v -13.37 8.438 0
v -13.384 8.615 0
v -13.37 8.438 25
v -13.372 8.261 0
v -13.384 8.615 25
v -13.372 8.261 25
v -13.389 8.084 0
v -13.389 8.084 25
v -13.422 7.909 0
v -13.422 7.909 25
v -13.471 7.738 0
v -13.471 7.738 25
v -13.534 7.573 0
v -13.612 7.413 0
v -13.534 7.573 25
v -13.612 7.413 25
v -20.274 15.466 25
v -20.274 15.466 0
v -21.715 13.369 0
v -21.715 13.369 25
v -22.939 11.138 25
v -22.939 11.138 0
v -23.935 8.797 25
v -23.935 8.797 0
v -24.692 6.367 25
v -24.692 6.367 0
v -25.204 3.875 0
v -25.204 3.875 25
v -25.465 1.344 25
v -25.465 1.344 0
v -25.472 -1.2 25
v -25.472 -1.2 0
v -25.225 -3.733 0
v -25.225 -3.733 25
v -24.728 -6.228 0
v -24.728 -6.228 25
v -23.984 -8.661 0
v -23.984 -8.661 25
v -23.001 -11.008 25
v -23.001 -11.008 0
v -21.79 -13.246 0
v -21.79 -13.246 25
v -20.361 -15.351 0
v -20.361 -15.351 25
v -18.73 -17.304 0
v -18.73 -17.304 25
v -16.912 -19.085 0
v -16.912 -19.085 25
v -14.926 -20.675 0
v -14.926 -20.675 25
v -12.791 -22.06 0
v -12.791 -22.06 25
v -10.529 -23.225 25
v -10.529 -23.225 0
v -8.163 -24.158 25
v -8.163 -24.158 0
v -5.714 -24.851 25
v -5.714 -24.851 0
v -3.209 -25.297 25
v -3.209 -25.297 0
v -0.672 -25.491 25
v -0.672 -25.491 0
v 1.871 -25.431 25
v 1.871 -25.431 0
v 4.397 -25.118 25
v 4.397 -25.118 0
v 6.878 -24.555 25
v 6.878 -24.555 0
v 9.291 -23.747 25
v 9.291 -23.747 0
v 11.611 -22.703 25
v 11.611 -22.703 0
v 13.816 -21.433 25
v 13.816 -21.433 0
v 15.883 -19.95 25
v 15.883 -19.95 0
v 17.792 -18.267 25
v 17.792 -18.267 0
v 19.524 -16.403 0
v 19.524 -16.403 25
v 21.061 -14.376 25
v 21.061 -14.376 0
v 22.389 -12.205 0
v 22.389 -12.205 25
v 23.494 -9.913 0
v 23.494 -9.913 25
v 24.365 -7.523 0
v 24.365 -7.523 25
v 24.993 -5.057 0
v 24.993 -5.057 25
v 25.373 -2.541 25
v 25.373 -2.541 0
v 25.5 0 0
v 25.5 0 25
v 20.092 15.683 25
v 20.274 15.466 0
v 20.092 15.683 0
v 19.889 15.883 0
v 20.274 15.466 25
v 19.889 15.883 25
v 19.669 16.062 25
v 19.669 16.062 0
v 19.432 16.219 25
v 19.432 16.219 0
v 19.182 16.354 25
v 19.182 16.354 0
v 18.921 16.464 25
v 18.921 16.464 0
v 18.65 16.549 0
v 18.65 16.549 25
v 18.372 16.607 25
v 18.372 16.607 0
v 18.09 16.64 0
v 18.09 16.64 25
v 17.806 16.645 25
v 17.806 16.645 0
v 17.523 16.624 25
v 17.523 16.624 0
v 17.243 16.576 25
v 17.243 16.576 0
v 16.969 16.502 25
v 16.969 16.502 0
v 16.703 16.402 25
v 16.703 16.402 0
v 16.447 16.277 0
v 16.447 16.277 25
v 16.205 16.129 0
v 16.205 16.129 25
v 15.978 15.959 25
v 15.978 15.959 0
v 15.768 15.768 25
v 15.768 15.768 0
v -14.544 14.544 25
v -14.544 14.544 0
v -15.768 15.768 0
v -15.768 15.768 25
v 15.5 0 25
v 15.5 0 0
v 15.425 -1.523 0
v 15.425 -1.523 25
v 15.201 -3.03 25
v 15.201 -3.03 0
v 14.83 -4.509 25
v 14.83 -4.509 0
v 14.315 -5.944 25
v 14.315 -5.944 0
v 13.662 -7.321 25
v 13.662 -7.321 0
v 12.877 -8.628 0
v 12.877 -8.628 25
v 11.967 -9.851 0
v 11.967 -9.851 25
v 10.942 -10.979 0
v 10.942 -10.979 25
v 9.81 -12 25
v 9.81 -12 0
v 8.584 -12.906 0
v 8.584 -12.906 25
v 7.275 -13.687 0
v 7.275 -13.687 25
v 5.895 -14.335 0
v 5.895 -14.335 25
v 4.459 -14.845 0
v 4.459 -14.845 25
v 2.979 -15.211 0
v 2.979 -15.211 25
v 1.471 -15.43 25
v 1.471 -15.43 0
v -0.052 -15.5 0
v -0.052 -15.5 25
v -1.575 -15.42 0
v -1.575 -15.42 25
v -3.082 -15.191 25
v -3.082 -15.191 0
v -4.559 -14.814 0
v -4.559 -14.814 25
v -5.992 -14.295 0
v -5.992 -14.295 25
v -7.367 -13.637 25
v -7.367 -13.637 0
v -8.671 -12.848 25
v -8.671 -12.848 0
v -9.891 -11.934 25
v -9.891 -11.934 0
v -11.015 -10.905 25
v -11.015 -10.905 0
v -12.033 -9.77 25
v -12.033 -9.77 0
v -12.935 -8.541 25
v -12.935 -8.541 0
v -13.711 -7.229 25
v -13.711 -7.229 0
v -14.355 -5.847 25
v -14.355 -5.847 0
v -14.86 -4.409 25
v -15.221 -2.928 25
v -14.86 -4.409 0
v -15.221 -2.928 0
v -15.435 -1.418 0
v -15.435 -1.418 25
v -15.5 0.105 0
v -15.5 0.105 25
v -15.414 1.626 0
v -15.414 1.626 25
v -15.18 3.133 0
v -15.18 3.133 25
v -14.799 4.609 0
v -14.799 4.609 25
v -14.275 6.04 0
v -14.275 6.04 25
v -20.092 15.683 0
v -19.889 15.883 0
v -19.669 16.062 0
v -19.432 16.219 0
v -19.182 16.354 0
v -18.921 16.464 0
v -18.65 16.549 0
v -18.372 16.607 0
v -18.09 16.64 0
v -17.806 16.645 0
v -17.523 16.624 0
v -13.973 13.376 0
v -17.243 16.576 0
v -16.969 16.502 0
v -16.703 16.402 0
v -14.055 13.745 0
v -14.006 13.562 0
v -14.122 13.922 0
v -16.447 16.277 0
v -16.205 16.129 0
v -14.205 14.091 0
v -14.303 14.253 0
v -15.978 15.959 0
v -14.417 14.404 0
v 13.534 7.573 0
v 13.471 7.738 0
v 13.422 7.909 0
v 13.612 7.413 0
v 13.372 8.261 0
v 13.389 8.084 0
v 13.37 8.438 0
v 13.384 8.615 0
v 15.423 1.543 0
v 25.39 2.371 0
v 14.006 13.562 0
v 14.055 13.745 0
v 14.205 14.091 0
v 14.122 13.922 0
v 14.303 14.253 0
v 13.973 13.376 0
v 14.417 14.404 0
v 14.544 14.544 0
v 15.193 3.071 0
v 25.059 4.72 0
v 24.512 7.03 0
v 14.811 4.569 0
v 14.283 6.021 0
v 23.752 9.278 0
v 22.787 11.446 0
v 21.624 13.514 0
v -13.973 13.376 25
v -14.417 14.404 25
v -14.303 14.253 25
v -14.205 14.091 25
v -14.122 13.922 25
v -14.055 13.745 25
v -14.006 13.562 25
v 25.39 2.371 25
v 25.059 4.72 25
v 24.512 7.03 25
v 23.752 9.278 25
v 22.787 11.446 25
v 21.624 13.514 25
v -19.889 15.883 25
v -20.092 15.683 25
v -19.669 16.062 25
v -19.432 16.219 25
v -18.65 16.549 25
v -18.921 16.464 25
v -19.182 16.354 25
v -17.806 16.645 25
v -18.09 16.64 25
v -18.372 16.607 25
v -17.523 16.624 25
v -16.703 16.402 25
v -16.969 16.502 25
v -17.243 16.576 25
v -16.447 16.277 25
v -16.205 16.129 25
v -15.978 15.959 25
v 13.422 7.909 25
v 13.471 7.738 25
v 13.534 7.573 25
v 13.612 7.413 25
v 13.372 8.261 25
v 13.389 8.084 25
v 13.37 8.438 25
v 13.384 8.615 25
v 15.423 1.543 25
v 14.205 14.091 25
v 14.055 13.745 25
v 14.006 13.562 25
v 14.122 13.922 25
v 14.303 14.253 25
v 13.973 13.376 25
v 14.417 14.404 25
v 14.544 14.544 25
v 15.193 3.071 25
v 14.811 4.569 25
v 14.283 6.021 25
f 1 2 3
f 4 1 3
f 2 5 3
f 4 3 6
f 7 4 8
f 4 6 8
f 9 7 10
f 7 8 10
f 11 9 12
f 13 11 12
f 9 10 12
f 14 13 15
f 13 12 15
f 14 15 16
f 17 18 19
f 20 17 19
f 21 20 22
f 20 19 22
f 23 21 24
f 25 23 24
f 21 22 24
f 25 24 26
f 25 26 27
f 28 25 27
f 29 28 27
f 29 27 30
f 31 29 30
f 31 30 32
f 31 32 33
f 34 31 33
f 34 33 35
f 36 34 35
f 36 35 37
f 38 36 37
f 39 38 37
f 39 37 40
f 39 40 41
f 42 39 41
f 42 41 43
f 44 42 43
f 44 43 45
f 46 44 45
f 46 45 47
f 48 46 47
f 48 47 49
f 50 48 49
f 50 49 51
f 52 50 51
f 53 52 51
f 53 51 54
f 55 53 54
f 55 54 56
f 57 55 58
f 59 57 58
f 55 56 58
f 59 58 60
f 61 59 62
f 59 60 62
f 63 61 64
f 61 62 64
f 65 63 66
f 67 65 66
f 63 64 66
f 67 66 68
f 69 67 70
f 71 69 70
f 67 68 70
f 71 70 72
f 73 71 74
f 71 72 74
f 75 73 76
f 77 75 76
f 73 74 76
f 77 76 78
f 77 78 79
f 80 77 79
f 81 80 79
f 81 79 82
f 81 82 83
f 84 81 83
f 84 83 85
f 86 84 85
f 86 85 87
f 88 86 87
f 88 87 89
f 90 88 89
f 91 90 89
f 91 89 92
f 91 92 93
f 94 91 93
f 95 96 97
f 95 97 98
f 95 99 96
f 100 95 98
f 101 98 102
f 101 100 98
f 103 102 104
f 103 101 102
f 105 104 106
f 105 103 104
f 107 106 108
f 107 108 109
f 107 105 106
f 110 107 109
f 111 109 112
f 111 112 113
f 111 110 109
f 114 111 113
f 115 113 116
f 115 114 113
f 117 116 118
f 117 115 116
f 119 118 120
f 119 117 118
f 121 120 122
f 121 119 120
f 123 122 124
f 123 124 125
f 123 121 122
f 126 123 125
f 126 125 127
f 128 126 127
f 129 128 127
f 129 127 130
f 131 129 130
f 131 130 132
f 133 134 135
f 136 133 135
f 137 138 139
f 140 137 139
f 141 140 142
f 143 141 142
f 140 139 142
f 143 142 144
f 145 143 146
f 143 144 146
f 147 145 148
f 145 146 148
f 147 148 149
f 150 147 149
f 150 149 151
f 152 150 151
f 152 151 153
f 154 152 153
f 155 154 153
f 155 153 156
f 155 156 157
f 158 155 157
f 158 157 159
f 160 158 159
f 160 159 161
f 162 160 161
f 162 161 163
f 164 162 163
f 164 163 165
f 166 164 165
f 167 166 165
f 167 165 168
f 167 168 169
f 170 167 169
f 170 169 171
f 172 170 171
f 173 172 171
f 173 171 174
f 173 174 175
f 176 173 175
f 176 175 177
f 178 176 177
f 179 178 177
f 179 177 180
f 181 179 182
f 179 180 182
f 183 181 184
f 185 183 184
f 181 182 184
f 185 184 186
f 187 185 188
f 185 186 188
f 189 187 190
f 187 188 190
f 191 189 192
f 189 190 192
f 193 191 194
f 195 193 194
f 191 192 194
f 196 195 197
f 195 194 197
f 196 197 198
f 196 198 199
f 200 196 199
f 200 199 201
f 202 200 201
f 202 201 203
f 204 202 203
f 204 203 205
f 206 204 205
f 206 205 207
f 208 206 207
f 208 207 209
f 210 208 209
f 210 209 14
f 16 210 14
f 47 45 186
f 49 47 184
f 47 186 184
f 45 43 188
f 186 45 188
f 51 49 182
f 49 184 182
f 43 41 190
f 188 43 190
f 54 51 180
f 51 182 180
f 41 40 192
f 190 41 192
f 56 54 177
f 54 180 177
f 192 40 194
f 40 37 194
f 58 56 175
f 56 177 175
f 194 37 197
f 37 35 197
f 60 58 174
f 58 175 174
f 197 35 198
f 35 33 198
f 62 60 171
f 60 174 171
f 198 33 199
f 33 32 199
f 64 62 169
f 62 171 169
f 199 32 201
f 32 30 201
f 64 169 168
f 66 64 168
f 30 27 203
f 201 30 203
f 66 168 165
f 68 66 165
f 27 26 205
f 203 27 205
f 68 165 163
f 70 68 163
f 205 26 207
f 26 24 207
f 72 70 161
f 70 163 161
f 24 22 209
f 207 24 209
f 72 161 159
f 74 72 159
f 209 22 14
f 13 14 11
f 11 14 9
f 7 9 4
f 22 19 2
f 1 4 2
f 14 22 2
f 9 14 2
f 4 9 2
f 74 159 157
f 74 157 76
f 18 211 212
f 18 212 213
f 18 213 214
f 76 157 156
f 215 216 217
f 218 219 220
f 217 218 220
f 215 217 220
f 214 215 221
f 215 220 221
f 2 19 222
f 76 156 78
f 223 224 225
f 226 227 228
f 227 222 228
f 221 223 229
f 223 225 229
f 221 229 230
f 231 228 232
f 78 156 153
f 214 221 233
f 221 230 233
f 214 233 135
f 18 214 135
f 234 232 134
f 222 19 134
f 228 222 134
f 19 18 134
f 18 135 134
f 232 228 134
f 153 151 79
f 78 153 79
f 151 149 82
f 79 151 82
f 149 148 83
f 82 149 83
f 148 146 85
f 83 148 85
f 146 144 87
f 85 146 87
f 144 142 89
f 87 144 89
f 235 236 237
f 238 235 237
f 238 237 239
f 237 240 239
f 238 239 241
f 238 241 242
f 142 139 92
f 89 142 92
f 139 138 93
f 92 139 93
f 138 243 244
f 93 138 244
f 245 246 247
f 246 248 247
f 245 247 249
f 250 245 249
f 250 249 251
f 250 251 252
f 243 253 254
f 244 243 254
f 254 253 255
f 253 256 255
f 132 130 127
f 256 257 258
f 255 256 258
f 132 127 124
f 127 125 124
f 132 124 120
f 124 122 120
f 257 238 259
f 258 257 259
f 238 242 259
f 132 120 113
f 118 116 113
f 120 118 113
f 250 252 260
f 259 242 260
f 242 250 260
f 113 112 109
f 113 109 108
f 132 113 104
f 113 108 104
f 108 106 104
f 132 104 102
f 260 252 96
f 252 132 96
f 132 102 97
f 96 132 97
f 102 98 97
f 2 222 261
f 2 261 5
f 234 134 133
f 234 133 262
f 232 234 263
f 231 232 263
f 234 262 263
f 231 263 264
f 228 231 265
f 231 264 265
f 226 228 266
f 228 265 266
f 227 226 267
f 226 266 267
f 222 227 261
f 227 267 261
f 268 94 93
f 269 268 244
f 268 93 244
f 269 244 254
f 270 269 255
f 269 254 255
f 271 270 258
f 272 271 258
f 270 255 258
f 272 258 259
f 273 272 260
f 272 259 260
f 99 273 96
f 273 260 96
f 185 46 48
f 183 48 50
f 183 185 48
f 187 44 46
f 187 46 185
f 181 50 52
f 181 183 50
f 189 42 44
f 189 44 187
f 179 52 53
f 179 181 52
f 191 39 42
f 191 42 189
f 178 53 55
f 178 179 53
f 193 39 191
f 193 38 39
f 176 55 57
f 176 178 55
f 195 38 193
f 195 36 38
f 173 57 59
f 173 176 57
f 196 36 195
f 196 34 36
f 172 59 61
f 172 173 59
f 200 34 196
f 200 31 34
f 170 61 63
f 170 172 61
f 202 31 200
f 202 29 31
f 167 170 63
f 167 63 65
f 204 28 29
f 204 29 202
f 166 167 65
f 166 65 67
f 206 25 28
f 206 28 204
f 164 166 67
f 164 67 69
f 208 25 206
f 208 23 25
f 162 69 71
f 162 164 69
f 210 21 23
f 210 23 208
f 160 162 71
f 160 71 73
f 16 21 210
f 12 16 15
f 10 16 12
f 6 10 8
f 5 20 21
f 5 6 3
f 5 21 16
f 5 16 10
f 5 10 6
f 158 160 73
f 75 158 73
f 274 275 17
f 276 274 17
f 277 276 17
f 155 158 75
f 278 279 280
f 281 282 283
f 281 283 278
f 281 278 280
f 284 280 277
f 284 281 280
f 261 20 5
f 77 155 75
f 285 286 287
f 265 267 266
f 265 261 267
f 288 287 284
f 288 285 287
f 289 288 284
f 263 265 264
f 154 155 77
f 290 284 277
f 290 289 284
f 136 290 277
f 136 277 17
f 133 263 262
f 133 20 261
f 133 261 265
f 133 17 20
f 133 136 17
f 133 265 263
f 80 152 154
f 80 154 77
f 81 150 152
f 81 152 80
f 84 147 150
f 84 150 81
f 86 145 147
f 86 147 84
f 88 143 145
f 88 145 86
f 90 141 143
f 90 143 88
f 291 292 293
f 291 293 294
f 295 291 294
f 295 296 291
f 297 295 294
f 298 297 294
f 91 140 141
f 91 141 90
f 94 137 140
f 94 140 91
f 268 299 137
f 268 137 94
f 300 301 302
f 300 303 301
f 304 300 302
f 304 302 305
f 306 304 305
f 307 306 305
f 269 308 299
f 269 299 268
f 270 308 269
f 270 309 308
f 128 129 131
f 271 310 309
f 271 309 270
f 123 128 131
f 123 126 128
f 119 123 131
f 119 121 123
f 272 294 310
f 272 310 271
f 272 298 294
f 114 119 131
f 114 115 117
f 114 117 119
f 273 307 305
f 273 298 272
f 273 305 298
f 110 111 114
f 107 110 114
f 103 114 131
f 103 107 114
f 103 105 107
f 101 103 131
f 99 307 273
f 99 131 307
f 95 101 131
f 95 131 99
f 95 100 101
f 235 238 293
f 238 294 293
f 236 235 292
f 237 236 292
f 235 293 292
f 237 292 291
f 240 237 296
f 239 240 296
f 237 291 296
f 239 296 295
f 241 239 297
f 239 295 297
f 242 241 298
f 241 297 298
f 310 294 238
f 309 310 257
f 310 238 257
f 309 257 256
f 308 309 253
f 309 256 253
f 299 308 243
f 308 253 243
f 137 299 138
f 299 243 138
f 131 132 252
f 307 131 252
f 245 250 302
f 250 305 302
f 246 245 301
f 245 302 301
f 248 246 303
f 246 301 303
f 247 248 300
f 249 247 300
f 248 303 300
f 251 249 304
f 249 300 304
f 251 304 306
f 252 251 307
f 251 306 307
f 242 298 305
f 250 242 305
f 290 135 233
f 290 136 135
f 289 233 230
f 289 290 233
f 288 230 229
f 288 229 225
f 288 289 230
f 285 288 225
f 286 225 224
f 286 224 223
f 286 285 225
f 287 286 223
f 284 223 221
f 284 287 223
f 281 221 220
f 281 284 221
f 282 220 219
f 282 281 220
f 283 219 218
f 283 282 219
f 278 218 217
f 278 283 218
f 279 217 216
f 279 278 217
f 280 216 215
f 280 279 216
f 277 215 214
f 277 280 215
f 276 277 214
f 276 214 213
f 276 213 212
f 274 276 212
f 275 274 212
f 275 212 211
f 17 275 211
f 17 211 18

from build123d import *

# Parameters (mm, degrees)
F1_DEPTH    = 25
F2_R        = 3
F3_T1_DEPTH = 47.7014436638
F4_R        = 2


# Not quite as in the source:
# - a fillet or chamfer that OpenCascade refuses, or shapes differently, is made with other operations: its cross-section is extruded or revolved along the edge and cut away or added


with BuildPart() as f1:
    # F0 (on Top) → F1 (new body)
    with BuildSketch(Plane.XY):
        with BuildLine():
            ThreePointArc((10.9601551084, 10.9601551084), (14.3201327539, 5.9315932017), (15.5, 0))
            ThreePointArc((15.5, 0), (-5.9315932017, -14.3201327539), (-10.9601551084, 10.9601551084))
            Line((-10.9601551084, 10.9601551084), (-18.0312229203, 18.0312229203))
            ThreePointArc((-18.0312229203, 18.0312229203), (-9.7584275253, -23.558928079), (25.5, 0))
            ThreePointArc((25.5, 0), (23.558928079, 9.7584275253), (18.0312229203, 18.0312229203))
            Line((18.0312229203, 18.0312229203), (10.9601551084, 10.9601551084))
        make_face()
    extrude(amount=F1_DEPTH)

    # F2
    f2_edges = [f1.edges().sort_by_distance(p)[0] for p in [
        (-18.031223, 18.031223, 12.5),
        (18.031223, 18.031223, 12.5),
    ]]
    fillet(f2_edges, radius=F2_R)

    # F3: chamfer of 5 on 2 edges, made by hand

    # F3_s2 → F3_t1 (cut)
    with BuildSketch(Plane.XY.offset(-11.3507218319)):
        with BuildLine():
            Line((-14.0579159195, 14.0579159195), (-13.3023645022, 7.9559473761))
            ThreePointArc((-13.3023645022, 7.9559473761), (-12.2677824681, 9.4737275301), (-10.9601551084, 10.9601551084))
            Line((-10.9601551084, 10.9601551084), (-14.0579159195, 14.0579159195))
        make_face()
        with BuildLine():
            Line((13.3023645022, 7.9559473761), (14.0579159195, 14.0579159195))
            Line((14.0579159195, 14.0579159195), (10.9601551084, 10.9601551084))
            ThreePointArc((10.9601551084, 10.9601551084), (12.2677824681, 9.4737275301), (13.3023645022, 7.9559473761))
        make_face()
    extrude(amount=F3_T1_DEPTH, mode=Mode.SUBTRACT)

    # F4
    f4_edges = [f1.edges().sort_by_distance(p)[0] for p in [
        (-13.302365, 7.955947, 12.5),
        (-14.057916, 14.057916, 12.5),
        (13.302365, 7.955947, 12.5),
        (14.057916, 14.057916, 12.5),
    ]]
    fillet(f4_edges, radius=F4_R)


solid = f1.part
